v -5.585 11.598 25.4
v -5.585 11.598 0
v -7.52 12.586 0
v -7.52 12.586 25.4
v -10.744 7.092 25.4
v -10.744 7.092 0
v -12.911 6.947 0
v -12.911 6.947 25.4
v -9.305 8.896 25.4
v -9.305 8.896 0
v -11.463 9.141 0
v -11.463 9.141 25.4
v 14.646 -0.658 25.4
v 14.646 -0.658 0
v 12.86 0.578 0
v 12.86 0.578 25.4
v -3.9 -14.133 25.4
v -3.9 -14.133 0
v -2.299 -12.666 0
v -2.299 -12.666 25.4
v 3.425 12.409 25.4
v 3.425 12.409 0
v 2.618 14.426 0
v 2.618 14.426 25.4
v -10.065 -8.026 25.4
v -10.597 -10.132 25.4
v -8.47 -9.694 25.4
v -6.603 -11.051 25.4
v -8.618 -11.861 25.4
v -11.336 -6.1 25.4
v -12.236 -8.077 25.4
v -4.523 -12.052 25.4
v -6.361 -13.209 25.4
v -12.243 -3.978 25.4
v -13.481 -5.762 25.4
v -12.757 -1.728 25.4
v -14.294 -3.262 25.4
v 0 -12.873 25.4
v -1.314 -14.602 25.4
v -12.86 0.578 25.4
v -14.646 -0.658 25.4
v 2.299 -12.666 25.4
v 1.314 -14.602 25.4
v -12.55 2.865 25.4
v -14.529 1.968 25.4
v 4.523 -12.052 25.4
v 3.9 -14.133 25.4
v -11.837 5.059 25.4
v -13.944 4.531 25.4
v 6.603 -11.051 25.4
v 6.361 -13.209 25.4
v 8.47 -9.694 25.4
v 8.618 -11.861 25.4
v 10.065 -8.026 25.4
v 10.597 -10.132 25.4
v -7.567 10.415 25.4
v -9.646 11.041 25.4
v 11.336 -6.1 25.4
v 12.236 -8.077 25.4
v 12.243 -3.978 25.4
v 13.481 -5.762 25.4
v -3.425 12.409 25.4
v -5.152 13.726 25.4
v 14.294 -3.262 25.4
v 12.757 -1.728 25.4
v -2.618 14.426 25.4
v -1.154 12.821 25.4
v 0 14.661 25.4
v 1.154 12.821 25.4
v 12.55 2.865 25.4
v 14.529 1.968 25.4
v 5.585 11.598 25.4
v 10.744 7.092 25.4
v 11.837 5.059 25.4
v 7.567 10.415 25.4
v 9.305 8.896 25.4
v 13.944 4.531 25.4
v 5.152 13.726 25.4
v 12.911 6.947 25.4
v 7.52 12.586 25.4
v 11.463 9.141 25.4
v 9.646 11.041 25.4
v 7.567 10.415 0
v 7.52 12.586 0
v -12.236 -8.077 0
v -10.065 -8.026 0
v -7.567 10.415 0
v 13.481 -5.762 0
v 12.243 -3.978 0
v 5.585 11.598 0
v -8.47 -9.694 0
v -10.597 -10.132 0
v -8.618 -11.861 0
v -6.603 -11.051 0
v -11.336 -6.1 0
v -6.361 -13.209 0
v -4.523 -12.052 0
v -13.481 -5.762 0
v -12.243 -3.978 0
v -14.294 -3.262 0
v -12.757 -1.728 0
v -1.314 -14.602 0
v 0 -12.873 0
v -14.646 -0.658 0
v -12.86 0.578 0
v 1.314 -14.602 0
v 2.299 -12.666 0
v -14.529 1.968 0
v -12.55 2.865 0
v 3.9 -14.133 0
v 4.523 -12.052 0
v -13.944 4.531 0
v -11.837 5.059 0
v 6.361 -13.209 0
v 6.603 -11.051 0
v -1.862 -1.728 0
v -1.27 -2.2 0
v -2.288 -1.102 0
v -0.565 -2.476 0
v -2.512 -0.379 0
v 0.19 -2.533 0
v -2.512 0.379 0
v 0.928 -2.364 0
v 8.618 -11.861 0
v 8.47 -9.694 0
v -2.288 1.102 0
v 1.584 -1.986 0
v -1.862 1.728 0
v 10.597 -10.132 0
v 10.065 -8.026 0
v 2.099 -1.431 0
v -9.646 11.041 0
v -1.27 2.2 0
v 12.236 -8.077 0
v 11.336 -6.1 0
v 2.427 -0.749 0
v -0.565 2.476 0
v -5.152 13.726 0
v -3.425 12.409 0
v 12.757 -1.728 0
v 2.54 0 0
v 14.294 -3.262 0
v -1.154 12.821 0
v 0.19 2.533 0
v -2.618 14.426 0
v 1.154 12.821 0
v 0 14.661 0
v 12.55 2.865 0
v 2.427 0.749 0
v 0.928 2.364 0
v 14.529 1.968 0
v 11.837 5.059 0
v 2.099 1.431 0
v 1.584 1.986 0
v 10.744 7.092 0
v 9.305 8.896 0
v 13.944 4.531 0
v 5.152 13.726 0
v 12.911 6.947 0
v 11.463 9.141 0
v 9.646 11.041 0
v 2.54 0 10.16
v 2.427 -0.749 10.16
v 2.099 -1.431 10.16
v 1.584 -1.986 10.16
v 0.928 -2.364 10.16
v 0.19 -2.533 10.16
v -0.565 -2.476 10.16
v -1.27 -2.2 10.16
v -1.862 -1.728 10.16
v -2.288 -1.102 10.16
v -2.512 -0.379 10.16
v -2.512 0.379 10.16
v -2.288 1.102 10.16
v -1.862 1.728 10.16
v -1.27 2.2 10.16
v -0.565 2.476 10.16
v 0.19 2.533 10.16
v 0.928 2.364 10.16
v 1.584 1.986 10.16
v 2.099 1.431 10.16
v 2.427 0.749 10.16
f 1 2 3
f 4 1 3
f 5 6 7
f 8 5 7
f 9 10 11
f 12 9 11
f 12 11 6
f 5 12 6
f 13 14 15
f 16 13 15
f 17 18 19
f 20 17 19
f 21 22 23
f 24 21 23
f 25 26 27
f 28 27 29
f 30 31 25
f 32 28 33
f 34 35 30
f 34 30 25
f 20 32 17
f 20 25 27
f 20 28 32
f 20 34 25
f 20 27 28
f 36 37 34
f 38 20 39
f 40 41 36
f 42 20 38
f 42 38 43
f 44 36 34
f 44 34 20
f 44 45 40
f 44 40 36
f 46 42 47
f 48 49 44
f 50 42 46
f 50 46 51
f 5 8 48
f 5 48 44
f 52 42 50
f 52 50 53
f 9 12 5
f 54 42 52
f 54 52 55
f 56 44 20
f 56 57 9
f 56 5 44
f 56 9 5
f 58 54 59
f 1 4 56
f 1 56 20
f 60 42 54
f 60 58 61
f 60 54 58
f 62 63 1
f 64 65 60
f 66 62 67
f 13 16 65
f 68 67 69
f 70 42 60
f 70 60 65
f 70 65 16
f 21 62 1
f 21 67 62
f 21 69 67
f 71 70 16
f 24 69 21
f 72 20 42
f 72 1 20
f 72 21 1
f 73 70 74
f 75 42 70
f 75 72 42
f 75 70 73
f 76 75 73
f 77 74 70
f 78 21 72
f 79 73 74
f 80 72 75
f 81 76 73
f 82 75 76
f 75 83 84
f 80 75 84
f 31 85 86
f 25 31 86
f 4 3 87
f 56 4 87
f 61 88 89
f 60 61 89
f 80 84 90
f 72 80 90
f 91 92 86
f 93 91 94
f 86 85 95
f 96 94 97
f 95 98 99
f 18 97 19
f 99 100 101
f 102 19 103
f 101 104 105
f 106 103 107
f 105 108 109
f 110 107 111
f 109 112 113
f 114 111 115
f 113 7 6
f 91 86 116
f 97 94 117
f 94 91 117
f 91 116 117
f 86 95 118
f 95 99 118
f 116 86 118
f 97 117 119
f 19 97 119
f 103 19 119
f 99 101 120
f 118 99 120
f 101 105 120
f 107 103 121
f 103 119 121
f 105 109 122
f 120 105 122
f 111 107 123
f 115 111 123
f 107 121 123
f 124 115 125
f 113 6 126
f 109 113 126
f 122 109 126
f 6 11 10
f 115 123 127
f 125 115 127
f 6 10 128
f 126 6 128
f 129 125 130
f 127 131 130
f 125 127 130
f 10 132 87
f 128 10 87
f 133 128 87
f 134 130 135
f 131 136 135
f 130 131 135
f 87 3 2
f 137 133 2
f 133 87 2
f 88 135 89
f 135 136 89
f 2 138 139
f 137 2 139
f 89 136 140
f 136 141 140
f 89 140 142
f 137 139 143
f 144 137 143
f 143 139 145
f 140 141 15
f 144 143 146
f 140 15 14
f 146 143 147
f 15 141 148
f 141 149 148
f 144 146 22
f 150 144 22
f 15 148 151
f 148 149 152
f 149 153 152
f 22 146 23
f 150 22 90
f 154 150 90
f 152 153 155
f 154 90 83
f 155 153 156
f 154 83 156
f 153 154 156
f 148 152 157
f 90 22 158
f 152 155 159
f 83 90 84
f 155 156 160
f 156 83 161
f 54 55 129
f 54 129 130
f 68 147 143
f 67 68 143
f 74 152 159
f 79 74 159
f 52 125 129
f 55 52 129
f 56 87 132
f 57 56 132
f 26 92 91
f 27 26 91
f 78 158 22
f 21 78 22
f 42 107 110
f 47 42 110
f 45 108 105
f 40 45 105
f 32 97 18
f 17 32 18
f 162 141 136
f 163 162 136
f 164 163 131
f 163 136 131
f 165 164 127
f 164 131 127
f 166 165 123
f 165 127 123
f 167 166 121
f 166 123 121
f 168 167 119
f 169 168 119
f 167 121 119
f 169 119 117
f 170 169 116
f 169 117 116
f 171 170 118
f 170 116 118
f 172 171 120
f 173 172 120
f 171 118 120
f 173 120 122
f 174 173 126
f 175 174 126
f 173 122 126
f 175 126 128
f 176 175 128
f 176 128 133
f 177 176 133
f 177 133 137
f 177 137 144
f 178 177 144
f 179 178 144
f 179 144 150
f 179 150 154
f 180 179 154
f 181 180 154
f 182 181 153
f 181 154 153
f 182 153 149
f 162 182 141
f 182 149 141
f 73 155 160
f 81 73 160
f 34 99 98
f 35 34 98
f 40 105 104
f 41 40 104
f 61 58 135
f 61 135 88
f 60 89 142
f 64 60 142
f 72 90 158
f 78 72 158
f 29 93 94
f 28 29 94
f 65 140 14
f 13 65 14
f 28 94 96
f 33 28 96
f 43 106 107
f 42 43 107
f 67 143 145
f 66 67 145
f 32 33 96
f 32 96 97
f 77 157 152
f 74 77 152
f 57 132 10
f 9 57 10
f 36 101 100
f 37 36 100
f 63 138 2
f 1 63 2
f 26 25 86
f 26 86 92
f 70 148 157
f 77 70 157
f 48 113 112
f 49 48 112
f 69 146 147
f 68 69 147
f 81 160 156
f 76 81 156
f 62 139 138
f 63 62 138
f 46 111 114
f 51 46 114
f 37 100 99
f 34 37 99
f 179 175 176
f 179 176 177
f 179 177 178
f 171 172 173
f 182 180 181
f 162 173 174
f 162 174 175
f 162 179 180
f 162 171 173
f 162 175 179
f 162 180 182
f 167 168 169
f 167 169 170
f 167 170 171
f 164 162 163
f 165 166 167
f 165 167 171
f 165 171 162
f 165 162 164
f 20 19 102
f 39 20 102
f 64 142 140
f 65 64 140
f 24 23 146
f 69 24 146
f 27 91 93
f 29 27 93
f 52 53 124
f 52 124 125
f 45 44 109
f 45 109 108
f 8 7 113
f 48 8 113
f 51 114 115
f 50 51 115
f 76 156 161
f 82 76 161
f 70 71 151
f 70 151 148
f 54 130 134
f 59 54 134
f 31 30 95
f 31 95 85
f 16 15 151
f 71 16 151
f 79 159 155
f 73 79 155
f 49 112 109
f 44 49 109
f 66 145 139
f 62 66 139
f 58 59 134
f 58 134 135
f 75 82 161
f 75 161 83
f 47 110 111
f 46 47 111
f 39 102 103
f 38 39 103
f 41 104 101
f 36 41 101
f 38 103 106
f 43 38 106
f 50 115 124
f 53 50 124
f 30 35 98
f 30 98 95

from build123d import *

# Parameters (mm, degrees)
F1_DEPTH = 25.4
F2_R     = 2.54
F3_DEPTH = 10.16


with BuildPart() as f1:
    # F0 (on Top) → F1 (new body)
    with BuildSketch(Plane.XY):
        with BuildLine():
            Line((-8.4697762195, -9.6944389239), (-8.4549061431, -9.4765269014))
            ThreePointArc((-8.4549061431, -9.4765269014), (-9.1794947706, -8.7764956421), (-9.8463125991, -8.0212298434))
            Line((-9.8463125991, -8.0212298434), (-10.0646723422, -8.0263083607))
            Line((-10.0646723422, -8.0263083607), (-10.5970315556, -10.1317995806))
            Line((-10.5970315556, -10.1317995806), (-8.4697762195, -9.6944389239))
        make_face()
        with BuildLine():
            ThreePointArc((-10.5256917391, 7.1063220736), (-9.9292598273, 7.9183204836), (-9.2703384989, 8.6804852466))
            Line((-9.2703384989, 8.6804852466), (-9.3046821958, 8.8961870761))
            Line((-9.3046821958, 8.8961870761), (-11.4625785344, 9.1411013491))
            Line((-11.4625785344, 9.1411013491), (-10.7436276648, 7.0918065299))
            Line((-10.7436276648, 7.0918065299), (-10.5256917391, 7.1063220736))
        make_face()
        with BuildLine():
            ThreePointArc((5.6291101888, 11.3843365412), (6.5138208231, 10.9022996787), (7.3575369752, 10.3516496105))
            Line((7.3575369752, 10.3516496105), (7.5666765851, 10.4146368498))
            Line((7.5666765851, 10.4146368498), (7.5197128529, 12.5858793551))
            Line((7.5197128529, 12.5858793551), (5.5854717631, 11.598351626))
            Line((5.5854717631, 11.598351626), (5.6291101888, 11.3843365412))
        make_face()
        with BuildLine():
            Line((8.4697762195, -9.6944389239), (8.2558324115, -9.6504523828))
            ThreePointArc((8.2558324115, -9.6504523828), (7.4648727041, -10.2745158286), (6.626933106, -10.8339170021))
            Line((6.626933106, -10.8339170021), (6.6026545201, -11.0509822435))
            Line((6.6026545201, -11.0509822435), (8.617630227, -11.8611504418))
            Line((8.617630227, -11.8611504418), (8.4697762195, -9.6944389239))
        make_face()
        with BuildLine():
            ThreePointArc((7.5713998544, 10.1962691336), (8.3558218194, 9.5640076182), (9.0876567396, 8.8715553869))
            Line((9.0876567396, 8.8715553869), (9.3046821958, 8.8961870761))
            Line((9.3046821958, 8.8961870761), (9.6461635097, 11.0409225193))
            Line((9.6461635097, 11.0409225193), (7.5666765851, 10.4146368498))
            Line((7.5666765851, 10.4146368498), (7.5713998544, 10.1962691336))
        make_face()
        with BuildLine():
            ThreePointArc((9.2703384989, 8.6804852466), (9.9292598273, 7.9183204836), (10.5256917391, 7.1063220736))
            Line((10.5256917391, 7.1063220736), (10.7436276648, 7.0918065299))
            Line((10.7436276648, 7.0918065299), (11.4625785344, 9.1411013491))
            Line((11.4625785344, 9.1411013491), (9.3046821958, 8.8961870761))
            Line((9.3046821958, 8.8961870761), (9.2703384989, 8.6804852466))
        make_face()
        with BuildLine():
            ThreePointArc((10.6713208363, 6.8857034214), (11.1835632546, 6.0181320134), (11.6254223454, 5.1126857218))
            Line((11.6254223454, 5.1126857218), (11.8372641008, 5.0594894867))
            Line((11.8372641008, 5.0594894867), (12.9105768535, 6.9474776603))
            Line((12.9105768535, 6.9474776603), (10.7436276648, 7.0918065299))
            Line((10.7436276648, 7.0918065299), (10.6713208363, 6.8857034214))
        make_face()
        with BuildLine():
            ThreePointArc((11.7293181417, 4.8696094227), (12.0784177569, 3.9245158286), (12.3515023122, 2.9547234442))
            Line((12.3515023122, 2.9547234442), (12.5504411288, 2.8645562884))
            Line((12.5504411288, 2.8645562884), (13.9436186098, 4.5305563231))
            Line((13.9436186098, 4.5305563231), (11.8372641008, 5.0594894867))
            Line((11.8372641008, 5.0594894867), (11.7293181417, 4.8696094227))
        make_face()
        with BuildLine():
            Line((6.6026545201, -11.0509822435), (6.4000029773, -10.9695014422))
            ThreePointArc((6.4000029773, -10.9695014422), (5.5103234868, -11.4423046224), (4.5859649862, -11.8430960962))
            Line((4.5859649862, -11.8430960962), (4.5233180717, -12.052337901))
            Line((4.5233180717, -12.052337901), (6.3612511723, -13.2092741683))
            Line((6.3612511723, -13.2092741683), (6.6026545201, -11.0509822435))
        make_face()
        with BuildLine():
            Line((-10.0646723422, -8.0263083607), (-10.01113154, -7.8145534287))
            ThreePointArc((-10.01113154, -7.8145534287), (-10.5990803223, -6.9963916644), (-11.1203241981, -6.134198377))
            Line((-11.1203241981, -6.134198377), (-11.3360816146, -6.1002056428))
            Line((-11.3360816146, -6.1002056428), (-12.2358355707, -8.0768043445))
            Line((-12.2358355707, -8.0768043445), (-10.0646723422, -8.0263083607))
        make_face()
        with BuildLine():
            ThreePointArc((-12.3515023122, 2.9547234442), (-12.0784177569, 3.9245158286), (-11.7293181417, 4.8696094227))
            Line((-11.7293181417, 4.8696094227), (-11.8372641008, 5.0594894867))
            Line((-11.8372641008, 5.0594894867), (-13.9436186098, 4.5305563231))
            Line((-13.9436186098, 4.5305563231), (-12.5504411288, 2.8645562884))
            Line((-12.5504411288, 2.8645562884), (-12.3515023122, 2.9547234442))
        make_face()
        with BuildLine():
            ThreePointArc((-9.0876567396, 8.8715553869), (-8.3558218194, 9.5640076182), (-7.5713998544, 10.1962691336))
            Line((-7.5713998544, 10.1962691336), (-7.5666765851, 10.4146368498))
            Line((-7.5666765851, 10.4146368498), (-9.6461635097, 11.0409225193))
            Line((-9.6461635097, 11.0409225193), (-9.3046821958, 8.8961870761))
            Line((-9.3046821958, 8.8961870761), (-9.0876567396, 8.8715553869))
        make_face()
        with BuildLine():
            Line((11.3360816146, -6.1002056428), (11.1203241981, -6.134198377))
            ThreePointArc((11.1203241981, -6.134198377), (10.5990803223, -6.9963916644), (10.01113154, -7.8145534287))
            Line((10.01113154, -7.8145534287), (10.0646723422, -8.0263083607))
            Line((10.0646723422, -8.0263083607), (12.2358355707, -8.0768043445))
            Line((12.2358355707, -8.0768043445), (11.3360816146, -6.1002056428))
        make_face()
        with BuildLine():
            Line((-4.5233180717, -12.052337901), (-4.5859649862, -11.8430960962))
            ThreePointArc((-4.5859649862, -11.8430960962), (-5.5103234868, -11.4423046224), (-6.4000029773, -10.9695014422))
            Line((-6.4000029773, -10.9695014422), (-6.6026545201, -11.0509822435))
            Line((-6.6026545201, -11.0509822435), (-6.3612511723, -13.2092741683))
            Line((-6.3612511723, -13.2092741683), (-4.5233180717, -12.052337901))
        make_face()
        with BuildLine():
            ThreePointArc((12.4103255111, 2.6970021705), (12.5850619745, 1.7047624759), (12.6805948318, 0.7017939239))
            Line((12.6805948318, 0.7017939239), (12.8602366525, 0.577553894))
            Line((12.8602366525, 0.577553894), (14.5285009911, 1.9680191779))
            Line((14.5285009911, 1.9680191779), (12.5504411288, 2.8645562884))
            Line((12.5504411288, 2.8645562884), (12.4103255111, 2.6970021705))
        make_face()
        with BuildLine():
            ThreePointArc((3.5058962901, 12.2065020052), (4.4624602658, 11.8901828571), (5.3909399186, 11.4990332982))
            Line((5.3909399186, 11.4990332982), (5.5854717631, 11.598351626))
            Line((5.5854717631, 11.598351626), (5.1515724377, 13.7263156728))
            Line((5.1515724377, 13.7263156728), (3.4247452829, 12.4092858378))
            Line((3.4247452829, 12.4092858378), (3.5058962901, 12.2065020052))
        make_face()
        with BuildLine():
            ThreePointArc((1.27, 12.6363404513), (2.2676725639, 12.4959057752), (3.2510736174, 12.2768285943))
            Line((3.2510736174, 12.2768285943), (3.4247452829, 12.4092858378))
            Line((3.4247452829, 12.4092858378), (2.6178562457, 14.4255769108))
            Line((2.6178562457, 14.4255769108), (1.1539446714, 12.8213753924))
            Line((1.1539446714, 12.8213753924), (1.27, 12.6363404513))
        make_face()
        with BuildLine():
            ThreePointArc((-11.6254223454, 5.1126857218), (-11.1835632546, 6.0181320134), (-10.6713208363, 6.8857034214))
            Line((-10.6713208363, 6.8857034214), (-10.7436276648, 7.0918065299))
            Line((-10.7436276648, 7.0918065299), (-12.9105768535, 6.9474776603))
            Line((-12.9105768535, 6.9474776603), (-11.8372641008, 5.0594894867))
            Line((-11.8372641008, 5.0594894867), (-11.6254223454, 5.1126857218))
        make_face()
        with BuildLine():
            ThreePointArc((12.6021225999, -1.5736918305), (12.6755070316, -0.788366343), (12.7, 0))
            ThreePointArc((12.7, 0), (12.6981135617, 0.2188880379), (12.6924548074, 0.4377110493))
            ThreePointArc((12.6924548074, 0.4377110493), (12.6872119451, 0.5697833455), (12.6805948318, 0.7017939239))
            ThreePointArc((12.6805948318, 0.7017939239), (12.5850619745, 1.7047624759), (12.4103255111, 2.6970021705))
            ThreePointArc((12.4103255111, 2.6970021705), (12.3815844847, 2.8260158612), (12.3515023122, 2.9547234442))
            ThreePointArc((12.3515023122, 2.9547234442), (12.0784177569, 3.9245158286), (11.7293181417, 4.8696094227))
            ThreePointArc((11.7293181417, 4.8696094227), (11.6780027114, 4.991417902), (11.6254223454, 5.1126857218))
            ThreePointArc((11.6254223454, 5.1126857218), (11.1835632546, 6.0181320134), (10.6713208363, 6.8857034214))
            ThreePointArc((10.6713208363, 6.8857034214), (10.5990803223, 6.9963916644), (10.5256917391, 7.1063220736))
            ThreePointArc((10.5256917391, 7.1063220736), (9.9292598273, 7.9183204836), (9.2703384989, 8.6804852466))
            ThreePointArc((9.2703384989, 8.6804852466), (9.1794947706, 8.7764956421), (9.0876567396, 8.8715553869))
            ThreePointArc((9.0876567396, 8.8715553869), (8.3558218194, 9.5640076182), (7.5713998544, 10.1962691336))
            ThreePointArc((7.5713998544, 10.1962691336), (7.4648727041, 10.2745158286), (7.3575369752, 10.3516496105))
            ThreePointArc((7.3575369752, 10.3516496105), (6.5138208231, 10.9022996787), (5.6291101888, 11.3843365412))
            ThreePointArc((5.6291101888, 11.3843365412), (5.5103234868, 11.4423046224), (5.3909399186, 11.4990332982))
            ThreePointArc((5.3909399186, 11.4990332982), (4.4624602658, 11.8901828571), (3.5058962901, 12.2065020052))
            ThreePointArc((3.5058962901, 12.2065020052), (3.3786679387, 12.2423283308), (3.2510736174, 12.2768285943))
            ThreePointArc((3.2510736174, 12.2768285943), (2.2676725639, 12.4959057752), (1.27, 12.6363404513))
            ThreePointArc((1.27, 12.6363404513), (1.1384192231, 12.6488735337), (1.0067151351, 12.660036518))
            ThreePointArc((1.0067151351, 12.660036518), (0, 12.7), (-1.0067151351, 12.660036518))
            ThreePointArc((-1.0067151351, 12.660036518), (-1.1384192231, 12.6488735337), (-1.27, 12.6363404513))
            ThreePointArc((-1.27, 12.6363404513), (-2.2676725639, 12.4959057752), (-3.2510736174, 12.2768285943))
            ThreePointArc((-3.2510736174, 12.2768285943), (-3.3786679387, 12.2423283308), (-3.5058962901, 12.2065020052))
            ThreePointArc((-3.5058962901, 12.2065020052), (-4.4624602658, 11.8901828571), (-5.3909399186, 11.4990332982))
            ThreePointArc((-5.3909399186, 11.4990332982), (-5.5103234868, 11.4423046224), (-5.6291101888, 11.3843365412))
            ThreePointArc((-5.6291101888, 11.3843365412), (-6.5138208231, 10.9022996787), (-7.3575369752, 10.3516496105))
            ThreePointArc((-7.3575369752, 10.3516496105), (-7.4648727041, 10.2745158286), (-7.5713998544, 10.1962691336))
            ThreePointArc((-7.5713998544, 10.1962691336), (-8.3558218194, 9.5640076182), (-9.0876567396, 8.8715553869))
            ThreePointArc((-9.0876567396, 8.8715553869), (-9.1794947706, 8.7764956421), (-9.2703384989, 8.6804852466))
            ThreePointArc((-9.2703384989, 8.6804852466), (-9.9292598273, 7.9183204836), (-10.5256917391, 7.1063220736))
            ThreePointArc((-10.5256917391, 7.1063220736), (-10.5990803223, 6.9963916644), (-10.6713208363, 6.8857034214))
            ThreePointArc((-10.6713208363, 6.8857034214), (-11.1835632546, 6.0181320134), (-11.6254223454, 5.1126857218))
            ThreePointArc((-11.6254223454, 5.1126857218), (-11.6780027114, 4.991417902), (-11.7293181417, 4.8696094227))
            ThreePointArc((-11.7293181417, 4.8696094227), (-12.0784177569, 3.9245158286), (-12.3515023122, 2.9547234442))
            ThreePointArc((-12.3515023122, 2.9547234442), (-12.3815844847, 2.8260158612), (-12.4103255111, 2.6970021705))
            ThreePointArc((-12.4103255111, 2.6970021705), (-12.5850619745, 1.7047624759), (-12.6805948318, 0.7017939239))
            ThreePointArc((-12.6805948318, 0.7017939239), (-12.6872119451, 0.5697833455), (-12.6924548074, 0.4377110493))
            ThreePointArc((-12.6924548074, 0.4377110493), (-12.6872119451, -0.5697833455), (-12.6021225999, -1.5736918305))
            ThreePointArc((-12.6021225999, -1.5736918305), (-12.5850619745, -1.7047624759), (-12.5666381627, -1.8356484651))
            ThreePointArc((-12.5666381627, -1.8356484651), (-12.3815844847, -2.8260158612), (-12.1186077785, -3.7985978347))
            ThreePointArc((-12.1186077785, -3.7985978347), (-12.0784177569, -3.9245158286), (-12.0369194276, -4.0500087275))
            ThreePointArc((-12.0369194276, -4.0500087275), (-11.6780027114, -4.991417902), (-11.245590932, -5.901413779))
            ThreePointArc((-11.245590932, -5.901413779), (-11.1835632546, -6.0181320134), (-11.1203241981, -6.134198377))
            ThreePointArc((-11.1203241981, -6.134198377), (-10.5990803223, -6.9963916644), (-10.01113154, -7.8145534287))
            ThreePointArc((-10.01113154, -7.8145534287), (-9.9292598273, -7.9183204836), (-9.8463125991, -8.0212298434))
            ThreePointArc((-9.8463125991, -8.0212298434), (-9.1794947706, -8.7764956421), (-8.4549061431, -9.4765269014))
            ThreePointArc((-8.4549061431, -9.4765269014), (-8.3558218194, -9.5640076182), (-8.2558324115, -9.6504523828))
            ThreePointArc((-8.2558324115, -9.6504523828), (-7.4648727041, -10.2745158286), (-6.626933106, -10.8339170021))
            ThreePointArc((-6.626933106, -10.8339170021), (-6.5138208231, -10.9022996787), (-6.4000029773, -10.9695014422))
            ThreePointArc((-6.4000029773, -10.9695014422), (-5.5103234868, -11.4423046224), (-4.5859649862, -11.8430960962))
            ThreePointArc((-4.5859649862, -11.8430960962), (-4.4624602658, -11.8901828571), (-4.3384721815, -11.9359816995))
            ThreePointArc((-4.3384721815, -11.9359816995), (-3.3786679387, -12.2423283308), (-2.3976001785, -12.4716283373))
            ThreePointArc((-2.3976001785, -12.4716283373), (-2.2676725639, -12.4959057752), (-2.1374993201, -12.518829684))
            ThreePointArc((-2.1374993201, -12.518829684), (-1.1384192231, -12.6488735337), (-0.1321745283, -12.6993121819))
            ThreePointArc((-0.1321745283, -12.6993121819), (0, -12.7), (0.1321745283, -12.6993121819))
            ThreePointArc((0.1321745283, -12.6993121819), (1.1384192231, -12.6488735337), (2.1374993201, -12.518829684))
            ThreePointArc((2.1374993201, -12.518829684), (2.2676725639, -12.4959057752), (2.3976001785, -12.4716283373))
            ThreePointArc((2.3976001785, -12.4716283373), (3.3786679387, -12.2423283308), (4.3384721815, -11.9359816995))
            ThreePointArc((4.3384721815, -11.9359816995), (4.4624602658, -11.8901828571), (4.5859649862, -11.8430960962))
            ThreePointArc((4.5859649862, -11.8430960962), (5.5103234868, -11.4423046224), (6.4000029773, -10.9695014422))
            ThreePointArc((6.4000029773, -10.9695014422), (6.5138208231, -10.9022996787), (6.626933106, -10.8339170021))
            ThreePointArc((6.626933106, -10.8339170021), (7.4648727041, -10.2745158286), (8.2558324115, -9.6504523828))
            ThreePointArc((8.2558324115, -9.6504523828), (8.3558218194, -9.5640076182), (8.4549061431, -9.4765269014))
            ThreePointArc((8.4549061431, -9.4765269014), (9.1794947706, -8.7764956421), (9.8463125991, -8.0212298434))
            ThreePointArc((9.8463125991, -8.0212298434), (9.9292598273, -7.9183204836), (10.01113154, -7.8145534287))
            ThreePointArc((10.01113154, -7.8145534287), (10.5990803223, -6.9963916644), (11.1203241981, -6.134198377))
            ThreePointArc((11.1203241981, -6.134198377), (11.1835632546, -6.0181320134), (11.245590932, -5.901413779))
            ThreePointArc((11.245590932, -5.901413779), (11.6780027114, -4.991417902), (12.0369194276, -4.0500087275))
            ThreePointArc((12.0369194276, -4.0500087275), (12.0784177569, -3.9245158286), (12.1186077785, -3.7985978347))
            ThreePointArc((12.1186077785, -3.7985978347), (12.3815844847, -2.8260158612), (12.5666381627, -1.8356484651))
            ThreePointArc((12.5666381627, -1.8356484651), (12.5850619745, -1.7047624759), (12.6021225999, -1.5736918305))
        make_face()
        with BuildLine():
            Line((-6.6026545201, -11.0509822435), (-6.626933106, -10.8339170021))
            ThreePointArc((-6.626933106, -10.8339170021), (-7.4648727041, -10.2745158286), (-8.2558324115, -9.6504523828))
            Line((-8.2558324115, -9.6504523828), (-8.4697762195, -9.6944389239))
            Line((-8.4697762195, -9.6944389239), (-8.617630227, -11.8611504418))
            Line((-8.617630227, -11.8611504418), (-6.6026545201, -11.0509822435))
        make_face()
        with BuildLine():
            ThreePointArc((-1.0067151351, 12.660036518), (0, 12.7), (1.0067151351, 12.660036518))
            Line((1.0067151351, 12.660036518), (1.1539446714, 12.8213753924))
            Line((1.1539446714, 12.8213753924), (0, 14.6611882374))
            Line((0, 14.6611882374), (-1.1539446714, 12.8213753924))
            Line((-1.1539446714, 12.8213753924), (-1.0067151351, 12.660036518))
        make_face()
        with BuildLine():
            Line((12.2431398966, -3.9780372961), (12.0369194276, -4.0500087275))
            ThreePointArc((12.0369194276, -4.0500087275), (11.6780027114, -4.991417902), (11.245590932, -5.901413779))
            Line((11.245590932, -5.901413779), (11.3360816146, -6.1002056428))
            Line((11.3360816146, -6.1002056428), (13.4813697629, -5.7622139711))
            Line((13.4813697629, -5.7622139711), (12.2431398966, -3.9780372961))
        make_face()
        with BuildLine():
            Line((-2.2985984587, -12.6663215016), (-2.3976001785, -12.4716283373))
            ThreePointArc((-2.3976001785, -12.4716283373), (-3.3786679387, -12.2423283308), (-4.3384721815, -11.9359816995))
            Line((-4.3384721815, -11.9359816995), (-4.5233180717, -12.052337901))
            Line((-4.5233180717, -12.052337901), (-3.9004162709, -14.1328409545))
            Line((-3.9004162709, -14.1328409545), (-2.2985984587, -12.6663215016))
        make_face()
        with BuildLine():
            ThreePointArc((-12.6805948318, 0.7017939239), (-12.5850619745, 1.7047624759), (-12.4103255111, 2.6970021705))
            Line((-12.4103255111, 2.6970021705), (-12.5504411288, 2.8645562884))
            Line((-12.5504411288, 2.8645562884), (-14.5285009911, 1.9680191779))
            Line((-14.5285009911, 1.9680191779), (-12.8602366525, 0.577553894))
            Line((-12.8602366525, 0.577553894), (-12.6805948318, 0.7017939239))
        make_face()
        with BuildLine():
            Line((10.0646723422, -8.0263083607), (9.8463125991, -8.0212298434))
            ThreePointArc((9.8463125991, -8.0212298434), (9.1794947706, -8.7764956421), (8.4549061431, -9.4765269014))
            Line((8.4549061431, -9.4765269014), (8.4697762195, -9.6944389239))
            Line((8.4697762195, -9.6944389239), (10.5970315556, -10.1317995806))
            Line((10.5970315556, -10.1317995806), (10.0646723422, -8.0263083607))
        make_face()
        with BuildLine():
            Line((-12.2431398966, -3.9780372961), (-12.1186077785, -3.7985978347))
            ThreePointArc((-12.1186077785, -3.7985978347), (-12.3815844847, -2.8260158612), (-12.5666381627, -1.8356484651))
            Line((-12.5666381627, -1.8356484651), (-12.7566935886, -1.7280115577))
            Line((-12.7566935886, -1.7280115577), (-14.2936016384, -3.2624212995))
            Line((-14.2936016384, -3.2624212995), (-12.2431398966, -3.9780372961))
        make_face()
        with BuildLine():
            Line((2.2985984587, -12.6663215016), (2.1374993201, -12.518829684))
            ThreePointArc((2.1374993201, -12.518829684), (1.1384192231, -12.6488735337), (0.1321745283, -12.6993121819))
            Line((0.1321745283, -12.6993121819), (0, -12.8731991074))
            Line((0, -12.8731991074), (1.3142187813, -14.6021666038))
            Line((1.3142187813, -14.6021666038), (2.2985984587, -12.6663215016))
        make_face()
        with BuildLine():
            ThreePointArc((12.6924548074, 0.4377110493), (12.6981135617, 0.2188880379), (12.7, 0))
            ThreePointArc((12.7, 0), (12.6755070316, -0.788366343), (12.6021225999, -1.5736918305))
            Line((12.6021225999, -1.5736918305), (12.7566935886, -1.7280115577))
            Line((12.7566935886, -1.7280115577), (14.6464253964, -0.657771723))
            Line((14.6464253964, -0.657771723), (12.8602366525, 0.577553894))
            Line((12.8602366525, 0.577553894), (12.6924548074, 0.4377110493))
        make_face()
        with BuildLine():
            ThreePointArc((-5.3909399186, 11.4990332982), (-4.4624602658, 11.8901828571), (-3.5058962901, 12.2065020052))
            Line((-3.5058962901, 12.2065020052), (-3.4247452829, 12.4092858378))
            Line((-3.4247452829, 12.4092858378), (-5.1515724377, 13.7263156728))
            Line((-5.1515724377, 13.7263156728), (-5.5854717631, 11.598351626))
            Line((-5.5854717631, 11.598351626), (-5.3909399186, 11.4990332982))
        make_face()
        with BuildLine():
            Line((0, -12.8731991074), (-0.1321745283, -12.6993121819))
            ThreePointArc((-0.1321745283, -12.6993121819), (-1.1384192231, -12.6488735337), (-2.1374993201, -12.518829684))
            Line((-2.1374993201, -12.518829684), (-2.2985984587, -12.6663215016))
            Line((-2.2985984587, -12.6663215016), (-1.3142187813, -14.6021666038))
            Line((-1.3142187813, -14.6021666038), (0, -12.8731991074))
        make_face()
        with BuildLine():
            Line((12.7566935886, -1.7280115577), (12.5666381627, -1.8356484651))
            ThreePointArc((12.5666381627, -1.8356484651), (12.3815844847, -2.8260158612), (12.1186077785, -3.7985978347))
            Line((12.1186077785, -3.7985978347), (12.2431398966, -3.9780372961))
            Line((12.2431398966, -3.9780372961), (14.2936016384, -3.2624212995))
            Line((14.2936016384, -3.2624212995), (12.7566935886, -1.7280115577))
        make_face()
        with BuildLine():
            Line((-12.7566935886, -1.7280115577), (-12.6021225999, -1.5736918305))
            ThreePointArc((-12.6021225999, -1.5736918305), (-12.6872119451, -0.5697833455), (-12.6924548074, 0.4377110493))
            Line((-12.6924548074, 0.4377110493), (-12.8602366525, 0.577553894))
            Line((-12.8602366525, 0.577553894), (-14.6464253964, -0.657771723))
            Line((-14.6464253964, -0.657771723), (-12.7566935886, -1.7280115577))
        make_face()
        with BuildLine():
            ThreePointArc((-3.2510736174, 12.2768285943), (-2.2676725639, 12.4959057752), (-1.27, 12.6363404513))
            Line((-1.27, 12.6363404513), (-1.1539446714, 12.8213753924))
            Line((-1.1539446714, 12.8213753924), (-2.6178562457, 14.4255769108))
            Line((-2.6178562457, 14.4255769108), (-3.4247452829, 12.4092858378))
            Line((-3.4247452829, 12.4092858378), (-3.2510736174, 12.2768285943))
        make_face()
        with BuildLine():
            ThreePointArc((-7.3575369752, 10.3516496105), (-6.5138208231, 10.9022996787), (-5.6291101888, 11.3843365412))
            Line((-5.6291101888, 11.3843365412), (-5.5854717631, 11.598351626))
            Line((-5.5854717631, 11.598351626), (-7.5197128529, 12.5858793551))
            Line((-7.5197128529, 12.5858793551), (-7.5666765851, 10.4146368498))
            Line((-7.5666765851, 10.4146368498), (-7.3575369752, 10.3516496105))
        make_face()
        with BuildLine():
            Line((-11.3360816146, -6.1002056428), (-11.245590932, -5.901413779))
            ThreePointArc((-11.245590932, -5.901413779), (-11.6780027114, -4.991417902), (-12.0369194276, -4.0500087275))
            Line((-12.0369194276, -4.0500087275), (-12.2431398966, -3.9780372961))
            Line((-12.2431398966, -3.9780372961), (-13.4813697629, -5.7622139711))
            Line((-13.4813697629, -5.7622139711), (-11.3360816146, -6.1002056428))
        make_face()
        with BuildLine():
            Line((4.5233180717, -12.052337901), (4.3384721815, -11.9359816995))
            ThreePointArc((4.3384721815, -11.9359816995), (3.3786679387, -12.2423283308), (2.3976001785, -12.4716283373))
            Line((2.3976001785, -12.4716283373), (2.2985984587, -12.6663215016))
            Line((2.2985984587, -12.6663215016), (3.9004162709, -14.1328409545))
            Line((3.9004162709, -14.1328409545), (4.5233180717, -12.052337901))
        make_face()
        with BuildLine():
            ThreePointArc((5.3909399186, 11.4990332982), (5.5103234868, 11.4423046224), (5.6291101888, 11.3843365412))
            Line((5.6291101888, 11.3843365412), (5.5854717631, 11.598351626))
            Line((5.5854717631, 11.598351626), (5.3909399186, 11.4990332982))
        make_face()
        with BuildLine():
            Line((4.5233180717, -12.052337901), (4.5859649862, -11.8430960962))
            ThreePointArc((4.5859649862, -11.8430960962), (4.4624602658, -11.8901828571), (4.3384721815, -11.9359816995))
            Line((4.3384721815, -11.9359816995), (4.5233180717, -12.052337901))
        make_face()
        with BuildLine():
            ThreePointArc((7.3575369752, 10.3516496105), (7.4648727041, 10.2745158286), (7.5713998544, 10.1962691336))
            Line((7.5713998544, 10.1962691336), (7.5666765851, 10.4146368498))
            Line((7.5666765851, 10.4146368498), (7.3575369752, 10.3516496105))
        make_face()
        with BuildLine():
            Line((-4.5233180717, -12.052337901), (-4.3384721815, -11.9359816995))
            ThreePointArc((-4.3384721815, -11.9359816995), (-4.4624602658, -11.8901828571), (-4.5859649862, -11.8430960962))
            Line((-4.5859649862, -11.8430960962), (-4.5233180717, -12.052337901))
        make_face()
        with BuildLine():
            ThreePointArc((10.5256917391, 7.1063220736), (10.5990803223, 6.9963916644), (10.6713208363, 6.8857034214))
            Line((10.6713208363, 6.8857034214), (10.7436276648, 7.0918065299))
            Line((10.7436276648, 7.0918065299), (10.5256917391, 7.1063220736))
        make_face()
        with BuildLine():
            ThreePointArc((9.0876567396, 8.8715553869), (9.1794947706, 8.7764956421), (9.2703384989, 8.6804852466))
            Line((9.2703384989, 8.6804852466), (9.3046821958, 8.8961870761))
            Line((9.3046821958, 8.8961870761), (9.0876567396, 8.8715553869))
        make_face()
        with BuildLine():
            Line((11.3360816146, -6.1002056428), (11.245590932, -5.901413779))
            ThreePointArc((11.245590932, -5.901413779), (11.1835632546, -6.0181320134), (11.1203241981, -6.134198377))
            Line((11.1203241981, -6.134198377), (11.3360816146, -6.1002056428))
        make_face()
        with BuildLine():
            ThreePointArc((11.6254223454, 5.1126857218), (11.6780027114, 4.991417902), (11.7293181417, 4.8696094227))
            Line((11.7293181417, 4.8696094227), (11.8372641008, 5.0594894867))
            Line((11.8372641008, 5.0594894867), (11.6254223454, 5.1126857218))
        make_face()
        with BuildLine():
            ThreePointArc((-12.4103255111, 2.6970021705), (-12.3815844847, 2.8260158612), (-12.3515023122, 2.9547234442))
            Line((-12.3515023122, 2.9547234442), (-12.5504411288, 2.8645562884))
            Line((-12.5504411288, 2.8645562884), (-12.4103255111, 2.6970021705))
        make_face()
        with BuildLine():
            Line((-11.3360816146, -6.1002056428), (-11.1203241981, -6.134198377))
            ThreePointArc((-11.1203241981, -6.134198377), (-11.1835632546, -6.0181320134), (-11.245590932, -5.901413779))
            Line((-11.245590932, -5.901413779), (-11.3360816146, -6.1002056428))
        make_face()
        with BuildLine():
            ThreePointArc((-7.5713998544, 10.1962691336), (-7.4648727041, 10.2745158286), (-7.3575369752, 10.3516496105))
            Line((-7.3575369752, 10.3516496105), (-7.5666765851, 10.4146368498))
            Line((-7.5666765851, 10.4146368498), (-7.5713998544, 10.1962691336))
        make_face()
        with BuildLine():
            ThreePointArc((12.3515023122, 2.9547234442), (12.3815844847, 2.8260158612), (12.4103255111, 2.6970021705))
            Line((12.4103255111, 2.6970021705), (12.5504411288, 2.8645562884))
            Line((12.5504411288, 2.8645562884), (12.3515023122, 2.9547234442))
        make_face()
        with BuildLine():
            ThreePointArc((12.6805948318, 0.7017939239), (12.6872119451, 0.5697833455), (12.6924548074, 0.4377110493))
            Line((12.6924548074, 0.4377110493), (12.8602366525, 0.577553894))
            Line((12.8602366525, 0.577553894), (12.6805948318, 0.7017939239))
        make_face()
        with BuildLine():
            ThreePointArc((3.2510736174, 12.2768285943), (3.3786679387, 12.2423283308), (3.5058962901, 12.2065020052))
            Line((3.5058962901, 12.2065020052), (3.4247452829, 12.4092858378))
            Line((3.4247452829, 12.4092858378), (3.2510736174, 12.2768285943))
        make_face()
        with BuildLine():
            Line((10.0646723422, -8.0263083607), (10.01113154, -7.8145534287))
            ThreePointArc((10.01113154, -7.8145534287), (9.9292598273, -7.9183204836), (9.8463125991, -8.0212298434))
            Line((9.8463125991, -8.0212298434), (10.0646723422, -8.0263083607))
        make_face()
        with BuildLine():
            ThreePointArc((-5.6291101888, 11.3843365412), (-5.5103234868, 11.4423046224), (-5.3909399186, 11.4990332982))
            Line((-5.3909399186, 11.4990332982), (-5.5854717631, 11.598351626))
            Line((-5.5854717631, 11.598351626), (-5.6291101888, 11.3843365412))
        make_face()
        with BuildLine():
            Line((-12.2431398966, -3.9780372961), (-12.0369194276, -4.0500087275))
            ThreePointArc((-12.0369194276, -4.0500087275), (-12.0784177569, -3.9245158286), (-12.1186077785, -3.7985978347))
            Line((-12.1186077785, -3.7985978347), (-12.2431398966, -3.9780372961))
        make_face()
        with BuildLine():
            Line((2.2985984587, -12.6663215016), (2.3976001785, -12.4716283373))
            ThreePointArc((2.3976001785, -12.4716283373), (2.2676725639, -12.4959057752), (2.1374993201, -12.518829684))
            Line((2.1374993201, -12.518829684), (2.2985984587, -12.6663215016))
        make_face()
        with BuildLine():
            Line((-6.6026545201, -11.0509822435), (-6.4000029773, -10.9695014422))
            ThreePointArc((-6.4000029773, -10.9695014422), (-6.5138208231, -10.9022996787), (-6.626933106, -10.8339170021))
            Line((-6.626933106, -10.8339170021), (-6.6026545201, -11.0509822435))
        make_face()
        with BuildLine():
            ThreePointArc((-11.7293181417, 4.8696094227), (-11.6780027114, 4.991417902), (-11.6254223454, 5.1126857218))
            Line((-11.6254223454, 5.1126857218), (-11.8372641008, 5.0594894867))
            Line((-11.8372641008, 5.0594894867), (-11.7293181417, 4.8696094227))
        make_face()
        with BuildLine():
            Line((6.6026545201, -11.0509822435), (6.626933106, -10.8339170021))
            ThreePointArc((6.626933106, -10.8339170021), (6.5138208231, -10.9022996787), (6.4000029773, -10.9695014422))
            Line((6.4000029773, -10.9695014422), (6.6026545201, -11.0509822435))
        make_face()
        with BuildLine():
            ThreePointArc((-9.2703384989, 8.6804852466), (-9.1794947706, 8.7764956421), (-9.0876567396, 8.8715553869))
            Line((-9.0876567396, 8.8715553869), (-9.3046821958, 8.8961870761))
            Line((-9.3046821958, 8.8961870761), (-9.2703384989, 8.6804852466))
        make_face()
        with BuildLine():
            Line((-10.0646723422, -8.0263083607), (-9.8463125991, -8.0212298434))
            ThreePointArc((-9.8463125991, -8.0212298434), (-9.9292598273, -7.9183204836), (-10.01113154, -7.8145534287))
            Line((-10.01113154, -7.8145534287), (-10.0646723422, -8.0263083607))
        make_face()
        with BuildLine():
            Line((-8.4697762195, -9.6944389239), (-8.2558324115, -9.6504523828))
            ThreePointArc((-8.2558324115, -9.6504523828), (-8.3558218194, -9.5640076182), (-8.4549061431, -9.4765269014))
            Line((-8.4549061431, -9.4765269014), (-8.4697762195, -9.6944389239))
        make_face()
        with BuildLine():
            ThreePointArc((-10.6713208363, 6.8857034214), (-10.5990803223, 6.9963916644), (-10.5256917391, 7.1063220736))
            Line((-10.5256917391, 7.1063220736), (-10.7436276648, 7.0918065299))
            Line((-10.7436276648, 7.0918065299), (-10.6713208363, 6.8857034214))
        make_face()
        with BuildLine():
            ThreePointArc((-1.27, 12.6363404513), (-1.1384192231, 12.6488735337), (-1.0067151351, 12.660036518))
            Line((-1.0067151351, 12.660036518), (-1.1539446714, 12.8213753924))
            Line((-1.1539446714, 12.8213753924), (-1.27, 12.6363404513))
        make_face()
        with BuildLine():
            Line((12.2431398966, -3.9780372961), (12.1186077785, -3.7985978347))
            ThreePointArc((12.1186077785, -3.7985978347), (12.0784177569, -3.9245158286), (12.0369194276, -4.0500087275))
            Line((12.0369194276, -4.0500087275), (12.2431398966, -3.9780372961))
        make_face()
        with BuildLine():
            Line((-2.2985984587, -12.6663215016), (-2.1374993201, -12.518829684))
            ThreePointArc((-2.1374993201, -12.518829684), (-2.2676725639, -12.4959057752), (-2.3976001785, -12.4716283373))
            Line((-2.3976001785, -12.4716283373), (-2.2985984587, -12.6663215016))
        make_face()
        with BuildLine():
            Line((-12.7566935886, -1.7280115577), (-12.5666381627, -1.8356484651))
            ThreePointArc((-12.5666381627, -1.8356484651), (-12.5850619745, -1.7047624759), (-12.6021225999, -1.5736918305))
            Line((-12.6021225999, -1.5736918305), (-12.7566935886, -1.7280115577))
        make_face()
        with BuildLine():
            Line((8.4697762195, -9.6944389239), (8.4549061431, -9.4765269014))
            ThreePointArc((8.4549061431, -9.4765269014), (8.3558218194, -9.5640076182), (8.2558324115, -9.6504523828))
            Line((8.2558324115, -9.6504523828), (8.4697762195, -9.6944389239))
        make_face()
        with BuildLine():
            Line((0, -12.8731991074), (0.1321745283, -12.6993121819))
            ThreePointArc((0.1321745283, -12.6993121819), (0, -12.7), (-0.1321745283, -12.6993121819))
            Line((-0.1321745283, -12.6993121819), (0, -12.8731991074))
        make_face()
        with BuildLine():
            Line((12.7566935886, -1.7280115577), (12.6021225999, -1.5736918305))
            ThreePointArc((12.6021225999, -1.5736918305), (12.5850619745, -1.7047624759), (12.5666381627, -1.8356484651))
            Line((12.5666381627, -1.8356484651), (12.7566935886, -1.7280115577))
        make_face()
        with BuildLine():
            ThreePointArc((-3.5058962901, 12.2065020052), (-3.3786679387, 12.2423283308), (-3.2510736174, 12.2768285943))
            Line((-3.2510736174, 12.2768285943), (-3.4247452829, 12.4092858378))
            Line((-3.4247452829, 12.4092858378), (-3.5058962901, 12.2065020052))
        make_face()
        with BuildLine():
            ThreePointArc((-12.6924548074, 0.4377110493), (-12.6872119451, 0.5697833455), (-12.6805948318, 0.7017939239))
            Line((-12.6805948318, 0.7017939239), (-12.8602366525, 0.577553894))
            Line((-12.8602366525, 0.577553894), (-12.6924548074, 0.4377110493))
        make_face()
        with BuildLine():
            ThreePointArc((1.0067151351, 12.660036518), (1.1384192231, 12.6488735337), (1.27, 12.6363404513))
            Line((1.27, 12.6363404513), (1.1539446714, 12.8213753924))
            Line((1.1539446714, 12.8213753924), (1.0067151351, 12.660036518))
        make_face()
    extrude(amount=F1_DEPTH)

    # F2 (on face) → F3 (cut)
    with BuildSketch(Plane(origin=(0, 0, 0), x_dir=(1, 0, 0), z_dir=(0, 0, -1))):
        Circle(F2_R)
    extrude(amount=-F3_DEPTH, mode=Mode.SUBTRACT)


solid = f1.part
